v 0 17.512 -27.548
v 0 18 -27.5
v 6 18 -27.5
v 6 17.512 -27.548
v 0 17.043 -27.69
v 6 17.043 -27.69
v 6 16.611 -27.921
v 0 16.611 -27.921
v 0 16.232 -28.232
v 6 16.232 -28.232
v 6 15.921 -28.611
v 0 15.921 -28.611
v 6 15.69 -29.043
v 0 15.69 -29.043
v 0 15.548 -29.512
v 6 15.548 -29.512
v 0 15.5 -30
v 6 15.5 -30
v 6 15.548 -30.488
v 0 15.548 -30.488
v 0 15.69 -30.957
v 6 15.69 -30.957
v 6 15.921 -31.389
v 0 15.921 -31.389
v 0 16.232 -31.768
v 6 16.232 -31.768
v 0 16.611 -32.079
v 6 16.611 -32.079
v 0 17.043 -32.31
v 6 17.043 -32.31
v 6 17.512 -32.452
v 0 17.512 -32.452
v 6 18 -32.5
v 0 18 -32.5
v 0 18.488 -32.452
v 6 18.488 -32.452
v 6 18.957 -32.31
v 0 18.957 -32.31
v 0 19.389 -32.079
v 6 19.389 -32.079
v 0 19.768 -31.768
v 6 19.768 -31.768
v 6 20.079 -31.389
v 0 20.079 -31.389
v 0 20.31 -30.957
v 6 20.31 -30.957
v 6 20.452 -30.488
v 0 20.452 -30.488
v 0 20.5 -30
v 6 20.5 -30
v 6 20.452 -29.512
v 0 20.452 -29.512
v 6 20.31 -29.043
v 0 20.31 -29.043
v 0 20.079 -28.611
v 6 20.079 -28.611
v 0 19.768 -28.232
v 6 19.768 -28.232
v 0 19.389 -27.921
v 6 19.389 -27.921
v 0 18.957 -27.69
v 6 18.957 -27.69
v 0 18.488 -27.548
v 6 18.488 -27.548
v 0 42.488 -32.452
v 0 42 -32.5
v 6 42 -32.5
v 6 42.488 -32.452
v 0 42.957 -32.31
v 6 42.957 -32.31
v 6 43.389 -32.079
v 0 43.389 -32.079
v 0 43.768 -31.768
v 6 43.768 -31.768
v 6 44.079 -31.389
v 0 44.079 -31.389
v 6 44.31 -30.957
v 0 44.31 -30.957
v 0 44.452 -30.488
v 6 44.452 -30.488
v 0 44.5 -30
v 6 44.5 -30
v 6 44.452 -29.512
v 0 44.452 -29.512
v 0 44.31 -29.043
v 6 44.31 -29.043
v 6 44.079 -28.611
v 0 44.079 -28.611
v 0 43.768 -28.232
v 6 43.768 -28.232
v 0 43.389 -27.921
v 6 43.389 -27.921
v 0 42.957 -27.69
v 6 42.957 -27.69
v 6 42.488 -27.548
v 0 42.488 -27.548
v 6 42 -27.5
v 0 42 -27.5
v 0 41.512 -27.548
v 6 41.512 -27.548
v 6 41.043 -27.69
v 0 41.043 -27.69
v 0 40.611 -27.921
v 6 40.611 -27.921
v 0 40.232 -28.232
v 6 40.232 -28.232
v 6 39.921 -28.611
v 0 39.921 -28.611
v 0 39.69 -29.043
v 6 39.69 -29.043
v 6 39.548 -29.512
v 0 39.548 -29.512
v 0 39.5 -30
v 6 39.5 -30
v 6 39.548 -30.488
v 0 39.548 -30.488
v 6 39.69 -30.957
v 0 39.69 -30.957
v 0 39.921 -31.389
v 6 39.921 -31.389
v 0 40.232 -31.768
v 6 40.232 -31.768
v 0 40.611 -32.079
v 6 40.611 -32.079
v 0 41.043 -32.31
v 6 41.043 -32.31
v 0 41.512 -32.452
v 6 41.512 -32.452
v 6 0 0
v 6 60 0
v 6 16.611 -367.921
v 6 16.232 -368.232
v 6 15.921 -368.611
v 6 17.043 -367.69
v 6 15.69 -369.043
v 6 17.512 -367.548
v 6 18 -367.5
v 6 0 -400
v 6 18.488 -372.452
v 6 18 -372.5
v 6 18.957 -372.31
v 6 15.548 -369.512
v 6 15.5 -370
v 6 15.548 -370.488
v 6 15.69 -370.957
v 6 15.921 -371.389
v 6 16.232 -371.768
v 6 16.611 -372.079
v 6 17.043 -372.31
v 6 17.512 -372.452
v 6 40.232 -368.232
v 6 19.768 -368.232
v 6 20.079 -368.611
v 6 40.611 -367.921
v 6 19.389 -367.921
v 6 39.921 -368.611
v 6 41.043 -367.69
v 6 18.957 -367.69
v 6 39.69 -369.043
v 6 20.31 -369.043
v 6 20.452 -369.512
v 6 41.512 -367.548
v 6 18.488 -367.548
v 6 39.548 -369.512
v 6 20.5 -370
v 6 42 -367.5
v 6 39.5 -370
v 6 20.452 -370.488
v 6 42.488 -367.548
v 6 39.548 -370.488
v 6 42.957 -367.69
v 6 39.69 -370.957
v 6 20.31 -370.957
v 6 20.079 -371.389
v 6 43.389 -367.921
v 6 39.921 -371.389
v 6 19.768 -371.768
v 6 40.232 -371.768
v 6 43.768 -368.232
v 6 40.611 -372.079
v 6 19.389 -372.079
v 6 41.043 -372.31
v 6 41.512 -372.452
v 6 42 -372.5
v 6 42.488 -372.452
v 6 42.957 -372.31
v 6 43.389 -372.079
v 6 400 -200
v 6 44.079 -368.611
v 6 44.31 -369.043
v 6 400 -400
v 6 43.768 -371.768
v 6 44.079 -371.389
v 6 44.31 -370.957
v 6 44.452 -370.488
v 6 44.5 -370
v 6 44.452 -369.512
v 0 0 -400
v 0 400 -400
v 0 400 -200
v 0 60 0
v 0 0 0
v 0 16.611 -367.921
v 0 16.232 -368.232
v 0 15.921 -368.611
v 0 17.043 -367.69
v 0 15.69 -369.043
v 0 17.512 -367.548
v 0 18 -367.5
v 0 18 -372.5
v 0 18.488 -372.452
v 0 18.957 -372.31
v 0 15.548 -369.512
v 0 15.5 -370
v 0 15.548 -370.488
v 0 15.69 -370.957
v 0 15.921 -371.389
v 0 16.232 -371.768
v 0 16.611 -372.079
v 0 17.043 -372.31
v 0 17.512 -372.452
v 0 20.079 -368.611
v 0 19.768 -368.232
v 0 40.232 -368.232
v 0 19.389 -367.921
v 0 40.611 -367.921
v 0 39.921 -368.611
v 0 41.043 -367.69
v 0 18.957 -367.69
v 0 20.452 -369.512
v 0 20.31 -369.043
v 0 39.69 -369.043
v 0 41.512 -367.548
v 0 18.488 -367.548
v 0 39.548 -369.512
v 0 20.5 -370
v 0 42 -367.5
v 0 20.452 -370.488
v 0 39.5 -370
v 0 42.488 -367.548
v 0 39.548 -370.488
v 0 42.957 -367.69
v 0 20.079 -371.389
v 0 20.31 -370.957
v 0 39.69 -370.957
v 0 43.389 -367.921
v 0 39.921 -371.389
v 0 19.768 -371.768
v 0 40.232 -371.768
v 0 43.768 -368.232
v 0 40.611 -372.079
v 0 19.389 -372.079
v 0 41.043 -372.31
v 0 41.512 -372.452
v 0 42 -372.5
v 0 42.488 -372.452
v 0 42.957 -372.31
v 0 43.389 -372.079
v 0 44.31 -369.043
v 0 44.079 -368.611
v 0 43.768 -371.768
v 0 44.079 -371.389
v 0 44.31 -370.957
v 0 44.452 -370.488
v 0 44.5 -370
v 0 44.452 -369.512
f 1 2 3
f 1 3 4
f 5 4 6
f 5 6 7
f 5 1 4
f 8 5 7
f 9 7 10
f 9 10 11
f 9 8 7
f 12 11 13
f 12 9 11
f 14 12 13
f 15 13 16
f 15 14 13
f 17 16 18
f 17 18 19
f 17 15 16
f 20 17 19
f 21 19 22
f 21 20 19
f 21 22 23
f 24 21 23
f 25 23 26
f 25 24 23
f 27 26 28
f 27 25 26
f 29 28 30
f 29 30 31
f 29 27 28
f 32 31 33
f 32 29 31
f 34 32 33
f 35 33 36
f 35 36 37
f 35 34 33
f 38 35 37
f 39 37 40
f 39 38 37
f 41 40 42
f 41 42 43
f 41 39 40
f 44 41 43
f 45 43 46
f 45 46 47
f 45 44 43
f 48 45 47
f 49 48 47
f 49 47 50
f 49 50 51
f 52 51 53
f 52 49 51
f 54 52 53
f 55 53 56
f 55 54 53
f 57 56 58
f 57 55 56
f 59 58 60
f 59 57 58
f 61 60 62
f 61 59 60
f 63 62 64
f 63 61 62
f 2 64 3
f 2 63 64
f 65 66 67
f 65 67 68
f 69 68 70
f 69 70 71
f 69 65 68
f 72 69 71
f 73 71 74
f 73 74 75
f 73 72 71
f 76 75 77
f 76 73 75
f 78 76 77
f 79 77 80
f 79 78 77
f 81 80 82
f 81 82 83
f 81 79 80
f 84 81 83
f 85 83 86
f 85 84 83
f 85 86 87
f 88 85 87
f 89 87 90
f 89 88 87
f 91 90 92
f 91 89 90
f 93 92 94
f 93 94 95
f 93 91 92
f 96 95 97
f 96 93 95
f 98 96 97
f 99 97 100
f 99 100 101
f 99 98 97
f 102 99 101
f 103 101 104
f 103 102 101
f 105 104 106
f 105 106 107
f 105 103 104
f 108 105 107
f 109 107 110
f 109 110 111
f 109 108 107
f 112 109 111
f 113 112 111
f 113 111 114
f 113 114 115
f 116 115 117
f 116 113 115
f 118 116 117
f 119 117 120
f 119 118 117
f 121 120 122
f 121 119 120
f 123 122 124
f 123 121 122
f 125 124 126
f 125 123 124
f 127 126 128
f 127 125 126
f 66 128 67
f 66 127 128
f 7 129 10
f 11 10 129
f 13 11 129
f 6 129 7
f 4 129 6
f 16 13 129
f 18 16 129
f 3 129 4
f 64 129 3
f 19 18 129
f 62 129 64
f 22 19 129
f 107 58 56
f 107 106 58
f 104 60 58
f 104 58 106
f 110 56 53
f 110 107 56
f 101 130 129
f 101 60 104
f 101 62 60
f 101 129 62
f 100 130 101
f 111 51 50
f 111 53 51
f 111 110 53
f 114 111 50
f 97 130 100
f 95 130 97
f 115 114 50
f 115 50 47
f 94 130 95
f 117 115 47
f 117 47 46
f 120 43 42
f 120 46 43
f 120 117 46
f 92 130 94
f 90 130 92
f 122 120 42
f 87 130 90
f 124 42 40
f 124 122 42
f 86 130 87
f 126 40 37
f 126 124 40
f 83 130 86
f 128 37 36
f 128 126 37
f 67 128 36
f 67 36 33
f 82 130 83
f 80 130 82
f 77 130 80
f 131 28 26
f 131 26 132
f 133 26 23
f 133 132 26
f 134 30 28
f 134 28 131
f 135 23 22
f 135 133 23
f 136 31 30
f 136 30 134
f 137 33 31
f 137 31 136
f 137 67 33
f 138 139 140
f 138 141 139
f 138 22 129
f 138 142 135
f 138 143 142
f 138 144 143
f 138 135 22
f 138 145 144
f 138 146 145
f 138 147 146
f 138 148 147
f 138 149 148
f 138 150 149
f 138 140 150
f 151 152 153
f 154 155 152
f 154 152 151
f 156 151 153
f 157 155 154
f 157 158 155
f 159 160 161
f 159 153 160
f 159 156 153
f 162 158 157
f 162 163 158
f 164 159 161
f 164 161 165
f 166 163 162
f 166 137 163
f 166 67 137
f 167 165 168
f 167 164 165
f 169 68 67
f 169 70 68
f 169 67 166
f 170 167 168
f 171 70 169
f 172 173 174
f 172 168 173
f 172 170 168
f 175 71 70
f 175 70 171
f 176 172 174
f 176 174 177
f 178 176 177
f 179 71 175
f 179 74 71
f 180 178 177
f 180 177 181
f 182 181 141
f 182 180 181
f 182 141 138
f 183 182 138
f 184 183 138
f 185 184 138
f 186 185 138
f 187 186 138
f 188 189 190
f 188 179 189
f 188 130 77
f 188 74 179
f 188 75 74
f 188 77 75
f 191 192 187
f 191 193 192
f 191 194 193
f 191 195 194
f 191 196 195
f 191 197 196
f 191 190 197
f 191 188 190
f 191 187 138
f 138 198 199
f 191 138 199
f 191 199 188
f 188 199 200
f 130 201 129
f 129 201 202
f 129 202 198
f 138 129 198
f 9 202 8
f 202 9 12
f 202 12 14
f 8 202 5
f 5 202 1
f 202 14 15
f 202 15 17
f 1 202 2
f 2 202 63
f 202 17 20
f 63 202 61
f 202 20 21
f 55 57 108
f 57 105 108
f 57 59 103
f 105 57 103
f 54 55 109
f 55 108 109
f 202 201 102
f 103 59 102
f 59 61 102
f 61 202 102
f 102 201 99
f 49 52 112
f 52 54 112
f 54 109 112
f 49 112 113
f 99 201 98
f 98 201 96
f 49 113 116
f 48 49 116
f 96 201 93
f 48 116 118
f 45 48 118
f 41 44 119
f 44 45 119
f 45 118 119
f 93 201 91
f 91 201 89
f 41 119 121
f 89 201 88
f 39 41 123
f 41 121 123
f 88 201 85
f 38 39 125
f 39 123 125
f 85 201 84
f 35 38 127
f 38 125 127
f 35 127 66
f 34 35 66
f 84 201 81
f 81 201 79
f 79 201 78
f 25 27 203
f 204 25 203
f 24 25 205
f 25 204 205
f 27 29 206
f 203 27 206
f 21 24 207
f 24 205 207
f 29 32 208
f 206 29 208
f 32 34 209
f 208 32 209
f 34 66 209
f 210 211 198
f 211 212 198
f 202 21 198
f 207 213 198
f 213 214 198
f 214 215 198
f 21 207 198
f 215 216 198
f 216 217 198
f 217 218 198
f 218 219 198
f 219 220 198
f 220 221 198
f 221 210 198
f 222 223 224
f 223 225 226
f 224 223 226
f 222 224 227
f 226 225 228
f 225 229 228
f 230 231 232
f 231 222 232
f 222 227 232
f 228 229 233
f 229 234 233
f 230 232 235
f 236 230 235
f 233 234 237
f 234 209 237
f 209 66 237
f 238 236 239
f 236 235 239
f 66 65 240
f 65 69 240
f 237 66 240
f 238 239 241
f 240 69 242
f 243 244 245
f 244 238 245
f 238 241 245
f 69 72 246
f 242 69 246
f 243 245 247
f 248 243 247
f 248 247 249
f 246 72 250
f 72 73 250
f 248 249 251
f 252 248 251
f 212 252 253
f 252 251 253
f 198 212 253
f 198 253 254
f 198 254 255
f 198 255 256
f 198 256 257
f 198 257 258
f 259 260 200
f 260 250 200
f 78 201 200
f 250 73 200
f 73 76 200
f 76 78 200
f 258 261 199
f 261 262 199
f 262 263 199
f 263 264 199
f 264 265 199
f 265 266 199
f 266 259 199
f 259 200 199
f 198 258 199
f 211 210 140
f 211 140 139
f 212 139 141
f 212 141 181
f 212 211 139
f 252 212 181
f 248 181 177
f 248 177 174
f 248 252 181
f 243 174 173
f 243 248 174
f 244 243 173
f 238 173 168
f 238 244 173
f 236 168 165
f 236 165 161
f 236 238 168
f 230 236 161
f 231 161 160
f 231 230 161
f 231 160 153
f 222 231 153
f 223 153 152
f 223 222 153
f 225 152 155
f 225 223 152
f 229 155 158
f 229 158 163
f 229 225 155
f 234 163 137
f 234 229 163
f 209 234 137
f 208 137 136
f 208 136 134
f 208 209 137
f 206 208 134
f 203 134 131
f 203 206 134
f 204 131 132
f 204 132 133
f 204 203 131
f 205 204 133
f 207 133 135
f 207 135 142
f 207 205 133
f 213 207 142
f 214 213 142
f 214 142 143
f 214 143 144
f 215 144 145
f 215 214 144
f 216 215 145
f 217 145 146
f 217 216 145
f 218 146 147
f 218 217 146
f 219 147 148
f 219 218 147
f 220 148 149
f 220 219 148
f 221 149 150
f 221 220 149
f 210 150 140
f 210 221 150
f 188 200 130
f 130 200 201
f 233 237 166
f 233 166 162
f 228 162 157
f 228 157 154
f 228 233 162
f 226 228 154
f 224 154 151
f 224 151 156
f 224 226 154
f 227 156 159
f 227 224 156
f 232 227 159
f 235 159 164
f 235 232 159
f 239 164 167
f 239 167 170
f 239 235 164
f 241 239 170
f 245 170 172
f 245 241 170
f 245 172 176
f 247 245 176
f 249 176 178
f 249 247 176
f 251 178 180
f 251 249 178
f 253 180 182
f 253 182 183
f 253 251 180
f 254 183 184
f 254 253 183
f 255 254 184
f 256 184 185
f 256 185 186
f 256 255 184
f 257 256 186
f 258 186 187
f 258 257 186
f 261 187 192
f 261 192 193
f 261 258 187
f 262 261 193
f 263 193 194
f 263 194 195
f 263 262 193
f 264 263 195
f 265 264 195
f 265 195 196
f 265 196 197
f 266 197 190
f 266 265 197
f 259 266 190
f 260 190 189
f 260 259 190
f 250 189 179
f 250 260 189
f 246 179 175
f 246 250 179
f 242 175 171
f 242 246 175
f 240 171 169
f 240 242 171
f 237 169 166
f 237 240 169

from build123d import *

# Parameters (mm, degrees)
SKETCH1_R           = 2.5
BOSS_EXTRUDE1_DEPTH = 6


with BuildPart() as part:
    # Sketch1 → Boss-Extrude1 (new body)
    with BuildSketch(Plane(origin=(0, 0, 0), x_dir=(0, 0, -1), z_dir=(1, 0, 0))):
        Polygon((0, 0), (400, 0), (400, 400), (200, 400), (0, 60), align=None)
        with Locations((30, 42)):
            Circle(SKETCH1_R, mode=Mode.SUBTRACT)
        with Locations(Location((30, 18, 0), (0, 0, 180))):
            Circle(SKETCH1_R, mode=Mode.SUBTRACT)
        with Locations((370, 18)):
            Circle(SKETCH1_R, mode=Mode.SUBTRACT)
        with Locations(Location((370, 42, 0), (0, 0, 180))):
            Circle(SKETCH1_R, mode=Mode.SUBTRACT)
    extrude(amount=BOSS_EXTRUDE1_DEPTH)


solid = part.part
